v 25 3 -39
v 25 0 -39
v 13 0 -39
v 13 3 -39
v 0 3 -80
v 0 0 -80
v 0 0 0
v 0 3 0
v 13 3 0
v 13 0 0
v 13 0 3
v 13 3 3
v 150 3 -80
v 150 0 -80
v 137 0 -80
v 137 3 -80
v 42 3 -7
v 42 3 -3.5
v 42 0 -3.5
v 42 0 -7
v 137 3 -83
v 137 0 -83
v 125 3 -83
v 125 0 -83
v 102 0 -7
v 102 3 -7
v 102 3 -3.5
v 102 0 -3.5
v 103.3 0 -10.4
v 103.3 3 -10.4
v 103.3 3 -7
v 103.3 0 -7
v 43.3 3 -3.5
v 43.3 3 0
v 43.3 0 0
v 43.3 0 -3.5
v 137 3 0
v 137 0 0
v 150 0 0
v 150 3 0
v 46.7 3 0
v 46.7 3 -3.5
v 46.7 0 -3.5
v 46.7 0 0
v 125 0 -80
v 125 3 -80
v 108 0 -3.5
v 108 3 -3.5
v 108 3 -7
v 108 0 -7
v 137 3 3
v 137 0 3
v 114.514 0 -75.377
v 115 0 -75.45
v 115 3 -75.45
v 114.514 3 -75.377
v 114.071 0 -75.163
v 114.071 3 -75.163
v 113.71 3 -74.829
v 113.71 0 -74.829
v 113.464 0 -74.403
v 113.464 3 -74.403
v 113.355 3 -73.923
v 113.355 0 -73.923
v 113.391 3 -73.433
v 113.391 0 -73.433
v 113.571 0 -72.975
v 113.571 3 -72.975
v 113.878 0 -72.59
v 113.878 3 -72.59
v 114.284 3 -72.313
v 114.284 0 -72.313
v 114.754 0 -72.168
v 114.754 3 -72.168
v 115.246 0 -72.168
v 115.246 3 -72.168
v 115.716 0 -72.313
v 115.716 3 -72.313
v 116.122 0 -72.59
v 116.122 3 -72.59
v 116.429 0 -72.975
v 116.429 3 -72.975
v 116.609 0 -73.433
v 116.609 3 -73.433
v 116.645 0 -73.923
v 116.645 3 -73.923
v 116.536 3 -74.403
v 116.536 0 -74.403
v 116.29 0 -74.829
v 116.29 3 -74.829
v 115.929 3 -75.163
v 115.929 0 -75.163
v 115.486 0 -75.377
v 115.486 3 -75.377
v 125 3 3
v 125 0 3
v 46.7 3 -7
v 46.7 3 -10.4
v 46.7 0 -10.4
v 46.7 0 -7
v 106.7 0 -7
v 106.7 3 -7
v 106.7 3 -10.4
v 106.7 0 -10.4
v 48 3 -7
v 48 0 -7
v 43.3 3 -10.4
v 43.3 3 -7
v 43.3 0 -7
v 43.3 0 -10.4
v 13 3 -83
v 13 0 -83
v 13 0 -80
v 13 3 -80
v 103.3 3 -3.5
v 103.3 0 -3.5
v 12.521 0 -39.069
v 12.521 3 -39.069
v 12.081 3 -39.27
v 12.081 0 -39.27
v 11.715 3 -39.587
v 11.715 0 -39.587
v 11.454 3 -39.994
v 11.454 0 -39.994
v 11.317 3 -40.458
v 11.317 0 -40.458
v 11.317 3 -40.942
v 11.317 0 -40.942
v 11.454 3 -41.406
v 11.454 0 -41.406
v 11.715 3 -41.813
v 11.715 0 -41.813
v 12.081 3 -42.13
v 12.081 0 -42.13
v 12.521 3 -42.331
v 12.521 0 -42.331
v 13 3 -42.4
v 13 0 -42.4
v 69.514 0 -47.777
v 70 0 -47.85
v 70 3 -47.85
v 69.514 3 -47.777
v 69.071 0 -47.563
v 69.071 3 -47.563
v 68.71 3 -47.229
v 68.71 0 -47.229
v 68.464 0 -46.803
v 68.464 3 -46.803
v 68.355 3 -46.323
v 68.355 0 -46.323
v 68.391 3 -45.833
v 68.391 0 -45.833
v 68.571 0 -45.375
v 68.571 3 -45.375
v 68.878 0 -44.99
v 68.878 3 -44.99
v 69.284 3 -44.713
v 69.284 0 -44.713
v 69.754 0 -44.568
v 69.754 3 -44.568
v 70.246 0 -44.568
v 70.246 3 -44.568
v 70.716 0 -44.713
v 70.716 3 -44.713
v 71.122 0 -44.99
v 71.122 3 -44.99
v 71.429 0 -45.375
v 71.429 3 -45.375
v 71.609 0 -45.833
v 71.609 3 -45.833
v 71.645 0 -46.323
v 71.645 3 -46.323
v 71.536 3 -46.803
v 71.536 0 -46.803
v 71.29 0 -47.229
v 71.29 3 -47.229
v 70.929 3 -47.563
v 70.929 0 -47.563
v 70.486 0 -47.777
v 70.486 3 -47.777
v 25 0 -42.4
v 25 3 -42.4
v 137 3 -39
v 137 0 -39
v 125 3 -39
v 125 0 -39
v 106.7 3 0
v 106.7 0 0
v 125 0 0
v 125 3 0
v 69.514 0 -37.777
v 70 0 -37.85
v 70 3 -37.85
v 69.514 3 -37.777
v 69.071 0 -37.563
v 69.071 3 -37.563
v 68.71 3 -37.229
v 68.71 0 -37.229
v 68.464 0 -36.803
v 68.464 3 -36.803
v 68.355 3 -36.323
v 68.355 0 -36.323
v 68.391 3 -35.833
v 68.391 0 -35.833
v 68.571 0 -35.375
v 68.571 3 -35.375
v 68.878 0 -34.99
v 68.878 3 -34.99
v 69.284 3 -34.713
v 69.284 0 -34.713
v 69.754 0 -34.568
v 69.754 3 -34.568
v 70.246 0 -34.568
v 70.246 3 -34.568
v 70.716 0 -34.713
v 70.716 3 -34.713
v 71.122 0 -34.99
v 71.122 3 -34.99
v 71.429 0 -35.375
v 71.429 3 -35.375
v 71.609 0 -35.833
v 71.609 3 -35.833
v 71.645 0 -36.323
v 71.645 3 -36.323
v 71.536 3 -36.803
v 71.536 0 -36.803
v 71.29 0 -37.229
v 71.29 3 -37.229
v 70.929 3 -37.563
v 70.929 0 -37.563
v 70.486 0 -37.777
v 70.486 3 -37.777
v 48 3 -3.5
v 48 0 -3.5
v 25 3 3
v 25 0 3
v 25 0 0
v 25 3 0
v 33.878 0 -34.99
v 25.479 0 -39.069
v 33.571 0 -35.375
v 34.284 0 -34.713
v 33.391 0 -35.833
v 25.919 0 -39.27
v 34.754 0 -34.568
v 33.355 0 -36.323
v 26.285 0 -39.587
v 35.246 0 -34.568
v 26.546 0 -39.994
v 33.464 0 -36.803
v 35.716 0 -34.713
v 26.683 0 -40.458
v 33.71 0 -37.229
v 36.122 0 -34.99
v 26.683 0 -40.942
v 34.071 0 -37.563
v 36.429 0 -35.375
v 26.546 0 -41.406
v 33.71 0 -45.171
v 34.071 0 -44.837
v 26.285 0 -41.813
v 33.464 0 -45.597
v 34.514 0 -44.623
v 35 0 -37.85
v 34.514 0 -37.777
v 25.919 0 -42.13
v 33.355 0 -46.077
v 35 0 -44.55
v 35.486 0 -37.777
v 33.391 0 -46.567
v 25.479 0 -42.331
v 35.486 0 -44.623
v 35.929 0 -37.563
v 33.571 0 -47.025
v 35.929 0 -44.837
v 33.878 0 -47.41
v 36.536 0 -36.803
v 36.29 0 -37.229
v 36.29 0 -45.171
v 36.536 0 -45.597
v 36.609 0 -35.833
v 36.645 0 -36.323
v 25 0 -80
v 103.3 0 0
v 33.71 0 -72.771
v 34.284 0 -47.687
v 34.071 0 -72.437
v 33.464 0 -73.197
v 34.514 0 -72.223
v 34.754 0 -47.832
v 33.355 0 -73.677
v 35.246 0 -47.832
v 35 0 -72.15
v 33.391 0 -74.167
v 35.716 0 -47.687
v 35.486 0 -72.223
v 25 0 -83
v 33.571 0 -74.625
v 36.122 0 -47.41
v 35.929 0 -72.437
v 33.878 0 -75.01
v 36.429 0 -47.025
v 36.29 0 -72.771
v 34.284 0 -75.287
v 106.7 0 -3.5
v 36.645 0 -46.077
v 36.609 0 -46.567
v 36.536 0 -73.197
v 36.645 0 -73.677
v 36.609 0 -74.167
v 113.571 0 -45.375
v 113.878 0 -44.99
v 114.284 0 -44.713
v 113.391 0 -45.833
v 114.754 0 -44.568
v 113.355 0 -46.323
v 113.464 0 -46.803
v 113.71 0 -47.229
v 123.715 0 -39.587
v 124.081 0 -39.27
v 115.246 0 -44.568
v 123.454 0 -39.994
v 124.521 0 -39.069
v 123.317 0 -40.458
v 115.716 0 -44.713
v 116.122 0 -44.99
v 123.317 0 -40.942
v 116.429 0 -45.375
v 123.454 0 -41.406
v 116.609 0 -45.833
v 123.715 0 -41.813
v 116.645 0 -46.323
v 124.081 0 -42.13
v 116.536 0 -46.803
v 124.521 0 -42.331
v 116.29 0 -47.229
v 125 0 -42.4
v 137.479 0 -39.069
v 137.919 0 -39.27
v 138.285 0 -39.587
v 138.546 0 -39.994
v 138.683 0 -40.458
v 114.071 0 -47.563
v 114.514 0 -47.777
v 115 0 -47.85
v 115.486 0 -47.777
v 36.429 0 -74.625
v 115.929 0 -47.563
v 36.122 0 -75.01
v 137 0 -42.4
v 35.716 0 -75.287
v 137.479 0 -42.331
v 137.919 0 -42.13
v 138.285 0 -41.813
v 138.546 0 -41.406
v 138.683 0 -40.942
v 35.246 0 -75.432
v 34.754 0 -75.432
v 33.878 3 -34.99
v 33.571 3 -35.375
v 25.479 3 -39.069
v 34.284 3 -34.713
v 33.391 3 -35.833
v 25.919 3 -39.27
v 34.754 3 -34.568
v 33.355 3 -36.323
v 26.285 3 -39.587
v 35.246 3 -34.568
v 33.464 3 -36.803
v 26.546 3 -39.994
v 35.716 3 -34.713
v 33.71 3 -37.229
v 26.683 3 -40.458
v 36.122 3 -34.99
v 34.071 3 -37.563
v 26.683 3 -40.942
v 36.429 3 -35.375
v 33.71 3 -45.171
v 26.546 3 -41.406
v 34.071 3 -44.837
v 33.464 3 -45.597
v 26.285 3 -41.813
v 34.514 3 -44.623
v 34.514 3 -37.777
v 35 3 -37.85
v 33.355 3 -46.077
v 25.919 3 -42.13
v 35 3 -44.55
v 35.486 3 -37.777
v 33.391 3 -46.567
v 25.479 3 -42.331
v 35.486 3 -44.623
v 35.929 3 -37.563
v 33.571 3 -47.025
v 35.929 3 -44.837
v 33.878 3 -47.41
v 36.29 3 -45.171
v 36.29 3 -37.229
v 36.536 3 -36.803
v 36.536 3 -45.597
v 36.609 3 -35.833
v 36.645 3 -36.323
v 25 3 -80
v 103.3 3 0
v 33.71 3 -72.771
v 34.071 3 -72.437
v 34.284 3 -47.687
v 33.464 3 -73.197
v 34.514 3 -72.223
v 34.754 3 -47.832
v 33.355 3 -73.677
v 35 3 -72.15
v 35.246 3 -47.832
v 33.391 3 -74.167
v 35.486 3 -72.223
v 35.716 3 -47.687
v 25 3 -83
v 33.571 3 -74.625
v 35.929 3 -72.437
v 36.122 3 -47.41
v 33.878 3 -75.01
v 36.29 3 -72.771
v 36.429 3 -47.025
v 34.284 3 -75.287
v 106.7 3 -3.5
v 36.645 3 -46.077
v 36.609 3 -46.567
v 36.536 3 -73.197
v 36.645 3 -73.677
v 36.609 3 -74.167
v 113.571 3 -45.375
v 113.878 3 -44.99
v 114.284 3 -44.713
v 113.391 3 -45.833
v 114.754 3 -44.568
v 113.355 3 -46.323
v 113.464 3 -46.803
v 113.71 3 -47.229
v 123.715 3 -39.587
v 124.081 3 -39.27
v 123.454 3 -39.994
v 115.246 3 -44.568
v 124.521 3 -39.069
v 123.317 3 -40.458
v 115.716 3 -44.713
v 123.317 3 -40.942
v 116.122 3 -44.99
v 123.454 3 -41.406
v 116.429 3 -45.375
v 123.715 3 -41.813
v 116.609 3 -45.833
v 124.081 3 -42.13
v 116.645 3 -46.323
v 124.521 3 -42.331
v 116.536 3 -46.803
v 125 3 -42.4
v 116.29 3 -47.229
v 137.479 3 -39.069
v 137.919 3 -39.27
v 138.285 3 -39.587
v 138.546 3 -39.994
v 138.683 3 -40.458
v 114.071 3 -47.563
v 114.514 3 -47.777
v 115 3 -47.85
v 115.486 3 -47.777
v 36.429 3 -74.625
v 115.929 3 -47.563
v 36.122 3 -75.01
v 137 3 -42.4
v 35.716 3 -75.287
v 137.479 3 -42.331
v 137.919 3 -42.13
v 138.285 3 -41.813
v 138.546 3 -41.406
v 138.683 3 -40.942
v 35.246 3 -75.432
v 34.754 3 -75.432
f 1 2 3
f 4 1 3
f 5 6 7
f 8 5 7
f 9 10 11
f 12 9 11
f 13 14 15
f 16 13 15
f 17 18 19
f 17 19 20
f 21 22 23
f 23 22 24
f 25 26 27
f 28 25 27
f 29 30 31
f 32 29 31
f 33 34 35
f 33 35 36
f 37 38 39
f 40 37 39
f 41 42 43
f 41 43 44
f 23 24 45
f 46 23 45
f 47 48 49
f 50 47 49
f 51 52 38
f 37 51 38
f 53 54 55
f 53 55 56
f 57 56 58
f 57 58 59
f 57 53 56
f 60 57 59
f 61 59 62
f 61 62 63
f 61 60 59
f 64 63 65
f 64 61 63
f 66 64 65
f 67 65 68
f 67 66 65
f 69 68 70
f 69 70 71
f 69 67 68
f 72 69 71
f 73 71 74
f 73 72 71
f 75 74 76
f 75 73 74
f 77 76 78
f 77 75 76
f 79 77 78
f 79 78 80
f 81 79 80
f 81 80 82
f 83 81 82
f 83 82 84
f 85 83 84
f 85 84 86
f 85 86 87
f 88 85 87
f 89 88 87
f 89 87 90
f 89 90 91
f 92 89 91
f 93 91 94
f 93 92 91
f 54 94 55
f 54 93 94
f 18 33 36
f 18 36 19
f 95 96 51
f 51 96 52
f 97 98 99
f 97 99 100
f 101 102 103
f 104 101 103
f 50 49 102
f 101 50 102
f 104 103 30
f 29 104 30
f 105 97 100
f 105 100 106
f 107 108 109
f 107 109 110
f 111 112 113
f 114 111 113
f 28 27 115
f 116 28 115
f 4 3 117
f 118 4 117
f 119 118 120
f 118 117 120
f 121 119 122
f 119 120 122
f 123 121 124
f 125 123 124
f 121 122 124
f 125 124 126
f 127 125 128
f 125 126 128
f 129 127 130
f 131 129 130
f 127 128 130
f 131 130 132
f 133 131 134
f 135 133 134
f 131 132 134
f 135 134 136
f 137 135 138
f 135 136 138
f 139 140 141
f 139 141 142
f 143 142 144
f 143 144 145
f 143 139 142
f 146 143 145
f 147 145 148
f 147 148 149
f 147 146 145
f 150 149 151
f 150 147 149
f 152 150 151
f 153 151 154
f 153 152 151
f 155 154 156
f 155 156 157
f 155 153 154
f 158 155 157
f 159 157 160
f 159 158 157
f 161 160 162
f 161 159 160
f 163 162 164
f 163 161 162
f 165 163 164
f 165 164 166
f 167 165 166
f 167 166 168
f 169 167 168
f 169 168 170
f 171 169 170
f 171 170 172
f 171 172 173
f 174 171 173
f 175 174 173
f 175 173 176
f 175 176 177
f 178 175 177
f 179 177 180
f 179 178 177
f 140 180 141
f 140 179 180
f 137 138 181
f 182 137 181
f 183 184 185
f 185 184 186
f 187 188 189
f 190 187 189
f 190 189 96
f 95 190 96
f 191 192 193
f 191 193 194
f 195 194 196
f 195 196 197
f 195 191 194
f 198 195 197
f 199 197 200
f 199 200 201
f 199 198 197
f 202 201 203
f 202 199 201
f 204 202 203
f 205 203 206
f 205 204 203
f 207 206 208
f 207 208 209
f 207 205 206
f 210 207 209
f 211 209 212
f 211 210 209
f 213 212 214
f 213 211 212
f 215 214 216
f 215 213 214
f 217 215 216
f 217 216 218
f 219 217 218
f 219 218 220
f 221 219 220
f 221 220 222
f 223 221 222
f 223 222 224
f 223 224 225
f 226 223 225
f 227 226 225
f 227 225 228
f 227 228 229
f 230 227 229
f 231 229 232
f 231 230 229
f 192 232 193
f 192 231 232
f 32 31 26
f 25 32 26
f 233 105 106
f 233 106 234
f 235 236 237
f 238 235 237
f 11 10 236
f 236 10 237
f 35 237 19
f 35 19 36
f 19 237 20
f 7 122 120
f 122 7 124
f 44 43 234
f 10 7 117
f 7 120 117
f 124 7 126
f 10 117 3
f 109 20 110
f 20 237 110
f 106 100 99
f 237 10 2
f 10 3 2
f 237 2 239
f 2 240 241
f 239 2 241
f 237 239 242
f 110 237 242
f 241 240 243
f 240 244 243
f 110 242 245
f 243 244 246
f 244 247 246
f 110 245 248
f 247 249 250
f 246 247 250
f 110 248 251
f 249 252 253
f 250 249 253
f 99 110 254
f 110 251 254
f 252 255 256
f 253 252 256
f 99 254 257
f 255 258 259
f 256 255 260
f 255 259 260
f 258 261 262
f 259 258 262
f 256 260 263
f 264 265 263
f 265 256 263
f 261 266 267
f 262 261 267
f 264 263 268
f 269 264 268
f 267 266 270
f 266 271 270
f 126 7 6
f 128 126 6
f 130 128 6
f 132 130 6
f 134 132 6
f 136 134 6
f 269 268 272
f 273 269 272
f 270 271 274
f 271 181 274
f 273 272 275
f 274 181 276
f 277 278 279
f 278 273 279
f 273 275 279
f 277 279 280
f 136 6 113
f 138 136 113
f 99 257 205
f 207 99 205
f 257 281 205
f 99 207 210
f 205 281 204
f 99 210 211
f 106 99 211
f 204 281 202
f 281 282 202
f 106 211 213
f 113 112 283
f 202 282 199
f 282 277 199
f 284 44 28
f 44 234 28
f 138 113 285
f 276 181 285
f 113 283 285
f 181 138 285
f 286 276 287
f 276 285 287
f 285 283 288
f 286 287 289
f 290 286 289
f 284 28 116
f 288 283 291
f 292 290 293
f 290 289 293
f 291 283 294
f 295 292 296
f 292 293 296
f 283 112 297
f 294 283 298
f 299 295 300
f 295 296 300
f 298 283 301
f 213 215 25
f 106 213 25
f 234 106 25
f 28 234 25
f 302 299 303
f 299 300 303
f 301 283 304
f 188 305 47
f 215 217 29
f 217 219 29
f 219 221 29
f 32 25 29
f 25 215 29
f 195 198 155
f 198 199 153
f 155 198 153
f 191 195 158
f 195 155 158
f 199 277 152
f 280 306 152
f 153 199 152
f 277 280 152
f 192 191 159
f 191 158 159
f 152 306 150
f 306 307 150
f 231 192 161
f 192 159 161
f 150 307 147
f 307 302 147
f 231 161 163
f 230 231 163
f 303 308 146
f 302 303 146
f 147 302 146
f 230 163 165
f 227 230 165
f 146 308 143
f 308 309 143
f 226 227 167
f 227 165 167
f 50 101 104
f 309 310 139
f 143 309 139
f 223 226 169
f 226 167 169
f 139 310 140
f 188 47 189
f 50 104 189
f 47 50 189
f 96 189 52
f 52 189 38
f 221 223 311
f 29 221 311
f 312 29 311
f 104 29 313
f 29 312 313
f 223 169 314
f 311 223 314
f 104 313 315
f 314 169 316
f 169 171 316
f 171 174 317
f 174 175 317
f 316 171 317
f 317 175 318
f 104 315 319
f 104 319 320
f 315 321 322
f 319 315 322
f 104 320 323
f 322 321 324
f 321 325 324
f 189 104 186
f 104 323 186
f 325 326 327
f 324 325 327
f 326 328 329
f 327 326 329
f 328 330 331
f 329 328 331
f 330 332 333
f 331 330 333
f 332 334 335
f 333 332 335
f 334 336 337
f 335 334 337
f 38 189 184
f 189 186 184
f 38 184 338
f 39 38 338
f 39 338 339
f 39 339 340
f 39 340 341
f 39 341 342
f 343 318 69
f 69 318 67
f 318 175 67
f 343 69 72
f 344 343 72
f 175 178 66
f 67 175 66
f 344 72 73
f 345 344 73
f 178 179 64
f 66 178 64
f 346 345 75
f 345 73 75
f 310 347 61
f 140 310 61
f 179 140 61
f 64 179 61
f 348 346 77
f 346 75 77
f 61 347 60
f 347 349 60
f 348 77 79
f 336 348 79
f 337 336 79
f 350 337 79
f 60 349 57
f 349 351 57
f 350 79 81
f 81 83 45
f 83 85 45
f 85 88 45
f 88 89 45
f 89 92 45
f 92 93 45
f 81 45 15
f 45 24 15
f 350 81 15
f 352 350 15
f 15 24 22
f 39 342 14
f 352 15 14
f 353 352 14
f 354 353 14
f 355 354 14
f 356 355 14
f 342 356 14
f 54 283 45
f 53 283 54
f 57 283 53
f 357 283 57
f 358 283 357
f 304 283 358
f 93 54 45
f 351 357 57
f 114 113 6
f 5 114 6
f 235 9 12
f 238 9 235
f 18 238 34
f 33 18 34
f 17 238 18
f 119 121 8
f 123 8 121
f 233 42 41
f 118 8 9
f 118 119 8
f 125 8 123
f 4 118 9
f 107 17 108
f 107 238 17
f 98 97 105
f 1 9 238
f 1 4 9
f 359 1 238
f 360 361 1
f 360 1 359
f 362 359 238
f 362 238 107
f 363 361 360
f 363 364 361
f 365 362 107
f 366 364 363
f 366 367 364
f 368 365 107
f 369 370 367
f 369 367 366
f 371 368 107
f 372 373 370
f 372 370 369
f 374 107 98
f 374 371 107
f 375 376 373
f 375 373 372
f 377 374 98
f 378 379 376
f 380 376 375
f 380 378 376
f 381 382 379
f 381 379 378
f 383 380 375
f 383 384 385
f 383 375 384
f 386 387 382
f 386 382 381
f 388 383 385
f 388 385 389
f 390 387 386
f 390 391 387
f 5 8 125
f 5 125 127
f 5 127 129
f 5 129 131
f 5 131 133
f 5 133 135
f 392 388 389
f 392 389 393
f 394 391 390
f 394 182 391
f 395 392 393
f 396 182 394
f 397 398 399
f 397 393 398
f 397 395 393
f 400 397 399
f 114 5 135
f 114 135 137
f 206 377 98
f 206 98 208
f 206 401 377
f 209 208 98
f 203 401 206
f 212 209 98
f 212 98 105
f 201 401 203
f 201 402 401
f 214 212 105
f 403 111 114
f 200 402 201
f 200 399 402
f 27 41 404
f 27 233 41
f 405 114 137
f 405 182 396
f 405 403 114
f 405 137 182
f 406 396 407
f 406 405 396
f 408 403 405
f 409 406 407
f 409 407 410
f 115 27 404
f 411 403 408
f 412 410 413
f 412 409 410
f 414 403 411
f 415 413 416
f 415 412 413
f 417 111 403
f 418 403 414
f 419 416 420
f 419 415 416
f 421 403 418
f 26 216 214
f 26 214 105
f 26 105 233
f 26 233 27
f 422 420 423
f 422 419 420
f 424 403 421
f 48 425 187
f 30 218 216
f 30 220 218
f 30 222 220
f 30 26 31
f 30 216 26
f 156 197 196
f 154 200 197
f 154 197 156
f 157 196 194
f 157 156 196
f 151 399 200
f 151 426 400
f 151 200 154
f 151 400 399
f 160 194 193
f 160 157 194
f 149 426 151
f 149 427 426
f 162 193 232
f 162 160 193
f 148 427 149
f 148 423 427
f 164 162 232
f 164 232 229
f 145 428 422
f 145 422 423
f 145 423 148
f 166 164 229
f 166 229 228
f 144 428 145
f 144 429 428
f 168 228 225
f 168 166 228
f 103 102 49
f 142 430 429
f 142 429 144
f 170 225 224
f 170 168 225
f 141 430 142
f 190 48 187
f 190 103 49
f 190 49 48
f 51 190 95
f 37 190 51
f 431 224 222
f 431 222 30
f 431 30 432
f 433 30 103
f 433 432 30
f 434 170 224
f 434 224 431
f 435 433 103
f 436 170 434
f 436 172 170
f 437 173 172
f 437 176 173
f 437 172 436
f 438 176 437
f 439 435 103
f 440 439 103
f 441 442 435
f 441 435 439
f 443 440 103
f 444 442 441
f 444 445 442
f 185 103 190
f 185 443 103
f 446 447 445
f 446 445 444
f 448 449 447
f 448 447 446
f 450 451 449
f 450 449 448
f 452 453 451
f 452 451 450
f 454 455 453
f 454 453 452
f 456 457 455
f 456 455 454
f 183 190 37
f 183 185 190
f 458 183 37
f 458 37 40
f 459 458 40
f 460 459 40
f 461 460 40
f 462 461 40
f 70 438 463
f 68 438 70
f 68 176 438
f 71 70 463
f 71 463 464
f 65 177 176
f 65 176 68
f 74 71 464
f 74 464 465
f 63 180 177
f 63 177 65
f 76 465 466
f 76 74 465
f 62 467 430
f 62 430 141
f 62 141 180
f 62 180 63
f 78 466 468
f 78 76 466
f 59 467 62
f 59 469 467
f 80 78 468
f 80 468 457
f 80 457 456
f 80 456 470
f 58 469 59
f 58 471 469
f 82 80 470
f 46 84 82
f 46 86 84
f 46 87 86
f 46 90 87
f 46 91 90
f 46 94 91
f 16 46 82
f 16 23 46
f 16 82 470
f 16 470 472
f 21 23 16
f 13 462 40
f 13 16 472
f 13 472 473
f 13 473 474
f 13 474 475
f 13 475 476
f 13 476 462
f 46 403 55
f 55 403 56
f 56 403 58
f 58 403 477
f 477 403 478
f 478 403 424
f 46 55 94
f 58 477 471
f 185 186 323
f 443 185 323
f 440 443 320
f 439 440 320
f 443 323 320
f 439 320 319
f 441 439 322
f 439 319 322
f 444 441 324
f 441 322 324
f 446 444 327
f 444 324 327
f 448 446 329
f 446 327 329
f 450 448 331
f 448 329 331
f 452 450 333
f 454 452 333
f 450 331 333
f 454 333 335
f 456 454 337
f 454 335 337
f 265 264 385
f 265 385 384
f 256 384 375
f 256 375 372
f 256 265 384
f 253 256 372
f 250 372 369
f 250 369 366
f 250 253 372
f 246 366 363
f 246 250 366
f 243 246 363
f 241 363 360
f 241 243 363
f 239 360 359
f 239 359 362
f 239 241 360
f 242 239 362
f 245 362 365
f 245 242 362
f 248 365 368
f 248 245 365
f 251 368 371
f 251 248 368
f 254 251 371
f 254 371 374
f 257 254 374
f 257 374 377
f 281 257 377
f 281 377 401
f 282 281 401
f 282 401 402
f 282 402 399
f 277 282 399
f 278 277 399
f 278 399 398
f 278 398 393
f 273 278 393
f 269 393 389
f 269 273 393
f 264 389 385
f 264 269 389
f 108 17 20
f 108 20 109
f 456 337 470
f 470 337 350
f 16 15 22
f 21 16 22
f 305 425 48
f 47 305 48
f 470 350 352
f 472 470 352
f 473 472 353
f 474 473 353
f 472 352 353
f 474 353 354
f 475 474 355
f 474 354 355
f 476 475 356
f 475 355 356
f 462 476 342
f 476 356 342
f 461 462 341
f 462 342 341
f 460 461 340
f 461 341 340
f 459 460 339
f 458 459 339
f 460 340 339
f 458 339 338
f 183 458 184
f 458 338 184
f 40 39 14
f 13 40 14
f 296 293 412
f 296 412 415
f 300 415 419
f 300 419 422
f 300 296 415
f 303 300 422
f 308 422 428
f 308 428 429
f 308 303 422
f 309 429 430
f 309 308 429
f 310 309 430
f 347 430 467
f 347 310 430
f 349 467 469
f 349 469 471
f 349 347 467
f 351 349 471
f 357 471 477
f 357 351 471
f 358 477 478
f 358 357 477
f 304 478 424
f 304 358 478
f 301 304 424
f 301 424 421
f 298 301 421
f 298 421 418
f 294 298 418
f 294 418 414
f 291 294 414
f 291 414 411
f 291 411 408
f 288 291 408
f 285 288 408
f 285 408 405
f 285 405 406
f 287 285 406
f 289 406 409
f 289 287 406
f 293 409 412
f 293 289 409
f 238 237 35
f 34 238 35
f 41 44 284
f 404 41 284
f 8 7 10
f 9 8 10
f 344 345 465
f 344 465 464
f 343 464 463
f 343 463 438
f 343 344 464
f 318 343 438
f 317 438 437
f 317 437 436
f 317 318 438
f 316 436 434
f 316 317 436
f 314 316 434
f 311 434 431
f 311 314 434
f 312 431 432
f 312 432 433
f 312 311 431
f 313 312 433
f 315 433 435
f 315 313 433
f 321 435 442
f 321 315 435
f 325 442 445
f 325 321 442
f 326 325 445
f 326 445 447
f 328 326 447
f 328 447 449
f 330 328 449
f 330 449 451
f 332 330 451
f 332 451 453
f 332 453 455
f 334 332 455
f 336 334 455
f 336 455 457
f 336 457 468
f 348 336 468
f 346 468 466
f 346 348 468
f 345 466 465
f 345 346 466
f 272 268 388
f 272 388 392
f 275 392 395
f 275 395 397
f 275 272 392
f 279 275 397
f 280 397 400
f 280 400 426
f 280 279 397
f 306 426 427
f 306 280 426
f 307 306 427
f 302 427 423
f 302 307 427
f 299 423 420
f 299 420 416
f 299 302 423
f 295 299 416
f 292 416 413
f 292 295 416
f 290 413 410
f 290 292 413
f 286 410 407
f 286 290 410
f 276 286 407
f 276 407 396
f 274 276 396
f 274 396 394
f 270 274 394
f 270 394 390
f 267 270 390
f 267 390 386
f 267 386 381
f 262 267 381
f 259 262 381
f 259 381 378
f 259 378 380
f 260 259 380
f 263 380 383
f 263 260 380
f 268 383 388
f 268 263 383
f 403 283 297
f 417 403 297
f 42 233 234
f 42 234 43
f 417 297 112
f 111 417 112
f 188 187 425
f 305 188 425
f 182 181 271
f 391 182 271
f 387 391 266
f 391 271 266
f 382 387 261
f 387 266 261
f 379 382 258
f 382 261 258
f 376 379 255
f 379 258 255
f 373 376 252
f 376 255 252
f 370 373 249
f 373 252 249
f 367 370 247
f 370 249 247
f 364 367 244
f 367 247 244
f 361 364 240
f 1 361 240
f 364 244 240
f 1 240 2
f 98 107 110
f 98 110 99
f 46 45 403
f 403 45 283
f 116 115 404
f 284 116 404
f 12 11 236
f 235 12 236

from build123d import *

# Parameters (mm, degrees)
SKETCH_1_R          = 1.65
EXTRUDE_1_DEPTH     = 3
CUT_EXTRUDE_1_DEPTH = 172.458449777


with BuildPart() as part:
    # 草图1 → 凸台-拉伸1 (new body)
    with BuildSketch(Plane(origin=(0, 0, 0), x_dir=(1, 0, 0), z_dir=(0, 1, 0))):
        Polygon((0, 0), (13, 0), (13, -3), (25, -3), (25, 0), (125, 0), (125, -3), (137, -3), (137, 0), (150, 0), (150, 80), (137, 80), (137, 83), (125, 83), (125, 80), (25, 80), (25, 83), (13, 83), (13, 80), (0, 80), align=None)
        with Locations(Location((35, 73.8, 0), (0, 0, 270))):
            Circle(SKETCH_1_R, mode=Mode.SUBTRACT)
        with Locations(Location((35, 46.2, 0), (0, 0, 270))):
            Circle(SKETCH_1_R, mode=Mode.SUBTRACT)
        with Locations(Location((115, 46.2, 0), (0, 0, 90))):
            Circle(SKETCH_1_R, mode=Mode.SUBTRACT)
        with Locations(Location((115, 73.8, 0), (0, 0, 90))):
            Circle(SKETCH_1_R, mode=Mode.SUBTRACT)
        with Locations(Location((35, 36.2, 0), (0, 0, 90))):
            Circle(SKETCH_1_R, mode=Mode.SUBTRACT)
        with Locations(Location((70, 46.2, 0), (0, 0, 90))):
            Circle(SKETCH_1_R, mode=Mode.SUBTRACT)
        with Locations(Location((70, 36.2, 0), (0, 0, 90))):
            Circle(SKETCH_1_R, mode=Mode.SUBTRACT)
        with BuildLine():
            Line((13, 42.4), (25, 42.4))
            ThreePointArc((25, 42.4), (26.7, 40.7), (25, 39))
            Line((25, 39), (13, 39))
            ThreePointArc((13, 39), (11.3, 40.7), (13, 42.4))
        make_face(mode=Mode.SUBTRACT)
        with BuildLine():
            Line((125, 42.4), (137, 42.4))
            ThreePointArc((137, 42.4), (138.7, 40.7), (137, 39))
            Line((137, 39), (125, 39))
            ThreePointArc((125, 39), (123.3, 40.7), (125, 42.4))
        make_face(mode=Mode.SUBTRACT)
    extrude(amount=EXTRUDE_1_DEPTH)

    # 草图2 → 切除-拉伸1 (cut, through all)
    with BuildSketch(Plane(origin=(0, 3, 0), x_dir=(1, 0, 0), z_dir=(0, 1, 0))):
        Polygon((43.3, 0), (43.3, 3.5), (42, 3.5), (42, 7), (43.3, 7), (43.3, 10.4), (46.7, 10.4), (46.7, 7), (48, 7), (48, 3.5), (46.7, 3.5), (46.7, 0), align=None)
        Polygon((103.3, 0), (106.7, 0), (106.7, 3.5), (108, 3.5), (108, 7), (106.7, 7), (106.7, 10.4), (103.3, 10.4), (103.3, 7), (102, 7), (102, 3.5), (103.3, 3.5), align=None)
    extrude(amount=-CUT_EXTRUDE_1_DEPTH, mode=Mode.SUBTRACT)


solid = part.part
